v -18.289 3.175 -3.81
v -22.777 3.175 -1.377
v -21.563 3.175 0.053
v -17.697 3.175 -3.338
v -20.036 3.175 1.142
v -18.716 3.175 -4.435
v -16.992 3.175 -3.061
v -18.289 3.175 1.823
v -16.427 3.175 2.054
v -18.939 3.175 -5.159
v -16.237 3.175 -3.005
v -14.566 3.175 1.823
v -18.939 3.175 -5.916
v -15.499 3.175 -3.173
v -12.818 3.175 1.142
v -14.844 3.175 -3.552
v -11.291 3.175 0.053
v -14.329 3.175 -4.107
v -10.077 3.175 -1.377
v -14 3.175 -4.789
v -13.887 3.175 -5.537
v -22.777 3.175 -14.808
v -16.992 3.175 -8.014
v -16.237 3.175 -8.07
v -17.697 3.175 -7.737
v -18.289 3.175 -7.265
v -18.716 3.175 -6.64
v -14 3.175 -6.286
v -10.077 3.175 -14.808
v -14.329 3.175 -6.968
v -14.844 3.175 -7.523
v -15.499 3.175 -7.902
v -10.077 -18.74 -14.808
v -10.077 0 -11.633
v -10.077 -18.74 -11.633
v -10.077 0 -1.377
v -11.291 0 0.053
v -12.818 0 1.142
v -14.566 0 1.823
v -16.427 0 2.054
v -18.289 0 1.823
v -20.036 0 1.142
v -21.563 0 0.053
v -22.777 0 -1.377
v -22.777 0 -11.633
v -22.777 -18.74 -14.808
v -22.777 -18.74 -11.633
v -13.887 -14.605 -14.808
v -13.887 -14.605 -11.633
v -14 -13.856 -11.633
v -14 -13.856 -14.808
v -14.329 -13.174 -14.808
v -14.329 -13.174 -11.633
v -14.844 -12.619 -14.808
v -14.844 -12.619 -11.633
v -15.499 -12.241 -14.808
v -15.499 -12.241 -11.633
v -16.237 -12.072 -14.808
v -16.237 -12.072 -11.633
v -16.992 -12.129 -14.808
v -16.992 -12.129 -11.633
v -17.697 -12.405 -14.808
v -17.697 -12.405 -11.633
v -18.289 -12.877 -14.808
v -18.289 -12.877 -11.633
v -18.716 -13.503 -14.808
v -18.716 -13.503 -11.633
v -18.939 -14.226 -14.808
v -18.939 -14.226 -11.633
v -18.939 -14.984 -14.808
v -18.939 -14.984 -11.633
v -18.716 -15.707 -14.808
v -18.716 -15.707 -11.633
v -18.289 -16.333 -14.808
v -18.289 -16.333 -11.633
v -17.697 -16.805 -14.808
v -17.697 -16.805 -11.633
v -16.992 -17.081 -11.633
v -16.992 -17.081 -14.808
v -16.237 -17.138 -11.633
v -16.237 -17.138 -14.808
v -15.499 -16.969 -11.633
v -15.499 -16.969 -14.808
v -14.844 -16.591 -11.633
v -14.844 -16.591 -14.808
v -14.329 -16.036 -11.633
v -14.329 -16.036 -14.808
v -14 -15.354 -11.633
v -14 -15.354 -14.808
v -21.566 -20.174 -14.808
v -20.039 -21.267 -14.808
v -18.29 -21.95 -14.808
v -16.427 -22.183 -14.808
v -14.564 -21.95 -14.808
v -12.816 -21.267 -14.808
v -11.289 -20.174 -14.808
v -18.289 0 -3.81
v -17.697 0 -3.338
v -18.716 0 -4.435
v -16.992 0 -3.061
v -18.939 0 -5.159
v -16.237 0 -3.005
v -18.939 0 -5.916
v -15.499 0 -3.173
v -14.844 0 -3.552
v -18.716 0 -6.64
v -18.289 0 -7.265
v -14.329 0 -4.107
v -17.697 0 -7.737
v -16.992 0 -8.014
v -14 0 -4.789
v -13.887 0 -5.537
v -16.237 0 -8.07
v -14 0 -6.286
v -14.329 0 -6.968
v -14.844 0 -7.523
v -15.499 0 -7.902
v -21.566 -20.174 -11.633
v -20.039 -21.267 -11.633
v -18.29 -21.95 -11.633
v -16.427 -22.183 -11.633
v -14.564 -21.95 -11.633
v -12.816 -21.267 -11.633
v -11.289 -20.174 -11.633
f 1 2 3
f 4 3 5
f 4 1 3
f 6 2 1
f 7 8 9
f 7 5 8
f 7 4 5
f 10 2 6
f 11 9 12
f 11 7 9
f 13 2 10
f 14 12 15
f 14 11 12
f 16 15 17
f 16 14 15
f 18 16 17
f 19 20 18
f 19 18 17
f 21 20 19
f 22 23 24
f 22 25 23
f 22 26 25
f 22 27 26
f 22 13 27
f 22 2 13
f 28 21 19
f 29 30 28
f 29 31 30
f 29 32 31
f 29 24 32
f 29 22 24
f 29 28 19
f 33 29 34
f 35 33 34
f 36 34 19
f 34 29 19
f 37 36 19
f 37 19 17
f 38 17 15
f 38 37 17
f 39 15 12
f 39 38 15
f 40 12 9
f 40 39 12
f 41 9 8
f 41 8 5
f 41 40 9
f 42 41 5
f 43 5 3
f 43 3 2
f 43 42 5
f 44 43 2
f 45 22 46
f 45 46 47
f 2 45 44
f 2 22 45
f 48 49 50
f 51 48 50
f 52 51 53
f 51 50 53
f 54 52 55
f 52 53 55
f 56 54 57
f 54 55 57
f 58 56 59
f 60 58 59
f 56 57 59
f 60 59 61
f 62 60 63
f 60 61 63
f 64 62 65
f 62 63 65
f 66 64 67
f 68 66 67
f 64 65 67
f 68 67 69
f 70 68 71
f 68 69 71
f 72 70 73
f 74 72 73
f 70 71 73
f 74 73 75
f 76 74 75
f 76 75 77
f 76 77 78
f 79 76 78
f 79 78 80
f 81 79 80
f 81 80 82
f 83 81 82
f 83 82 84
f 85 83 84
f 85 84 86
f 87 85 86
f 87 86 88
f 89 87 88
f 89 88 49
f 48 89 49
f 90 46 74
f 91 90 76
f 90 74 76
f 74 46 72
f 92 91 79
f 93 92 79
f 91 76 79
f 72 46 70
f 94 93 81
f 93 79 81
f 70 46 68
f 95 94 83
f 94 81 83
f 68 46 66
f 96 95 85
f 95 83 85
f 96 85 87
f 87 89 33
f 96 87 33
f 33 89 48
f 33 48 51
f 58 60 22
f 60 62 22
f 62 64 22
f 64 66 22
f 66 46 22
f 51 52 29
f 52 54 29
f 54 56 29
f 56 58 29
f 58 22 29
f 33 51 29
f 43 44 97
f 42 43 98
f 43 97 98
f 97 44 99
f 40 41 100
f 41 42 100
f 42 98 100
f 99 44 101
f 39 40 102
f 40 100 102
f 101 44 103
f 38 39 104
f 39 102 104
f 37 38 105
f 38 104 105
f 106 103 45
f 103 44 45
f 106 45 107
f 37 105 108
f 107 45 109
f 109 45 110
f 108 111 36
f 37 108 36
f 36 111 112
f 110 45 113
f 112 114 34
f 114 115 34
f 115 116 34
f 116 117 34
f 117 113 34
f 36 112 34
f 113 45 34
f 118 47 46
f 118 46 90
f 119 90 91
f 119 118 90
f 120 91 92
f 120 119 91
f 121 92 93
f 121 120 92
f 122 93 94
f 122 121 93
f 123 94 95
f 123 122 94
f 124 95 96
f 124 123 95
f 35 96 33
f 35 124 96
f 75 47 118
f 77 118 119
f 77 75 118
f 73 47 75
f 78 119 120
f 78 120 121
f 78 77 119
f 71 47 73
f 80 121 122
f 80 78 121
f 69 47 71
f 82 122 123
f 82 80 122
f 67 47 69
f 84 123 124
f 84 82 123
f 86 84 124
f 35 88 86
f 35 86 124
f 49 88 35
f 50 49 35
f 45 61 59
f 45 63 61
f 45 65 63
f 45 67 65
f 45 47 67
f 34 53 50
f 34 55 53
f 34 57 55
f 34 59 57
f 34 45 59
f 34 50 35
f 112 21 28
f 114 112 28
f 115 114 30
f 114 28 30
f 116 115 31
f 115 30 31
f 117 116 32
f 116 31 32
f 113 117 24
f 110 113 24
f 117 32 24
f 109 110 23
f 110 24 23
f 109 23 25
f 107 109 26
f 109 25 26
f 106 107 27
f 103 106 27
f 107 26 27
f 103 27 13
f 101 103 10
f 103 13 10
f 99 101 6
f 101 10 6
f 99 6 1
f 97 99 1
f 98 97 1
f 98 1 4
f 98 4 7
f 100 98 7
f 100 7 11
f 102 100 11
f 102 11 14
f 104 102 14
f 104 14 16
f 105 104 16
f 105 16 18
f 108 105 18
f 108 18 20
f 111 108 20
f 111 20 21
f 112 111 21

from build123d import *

# Parameters (mm, degrees)
SKETCH1_W           = 12.7
SKETCH1_H           = 16.891
BOSS_EXTRUDE1_DEPTH = 3.175
SKETCH2_R           = 2.54
CUT_EXTRUDE1_DEPTH  = 4.175
SKETCH3_W           = 12.7
SKETCH3_H           = 3.175
BOSS_EXTRUDE2_DEPTH = 22.225
SKETCH4_R           = 2.54
CUT_EXTRUDE2_DEPTH  = 4.175
CUT_EXTRUDE3_DEPTH  = 4.175
CUT_EXTRUDE4_DEPTH  = 4.175


with BuildPart() as part:
    # Sketch1 → Boss-Extrude1 (new body)
    with BuildSketch(Plane(origin=(0, 0, 0), x_dir=(1, 0, 0), z_dir=(0, 1, 0))):
        with Locations((-16.427296288, 6.362973118)):
            Rectangle(SKETCH1_W, SKETCH1_H)
    extrude(amount=BOSS_EXTRUDE1_DEPTH)

    # Sketch2 → Cut-Extrude1 (cut, through all)
    with BuildSketch(Plane(origin=(0, 3.175, 0), x_dir=(1, 0, 0), z_dir=(0, 1, 0))):
        with Locations((-16.427296288, 5.537473118)):
            Circle(SKETCH2_R)
    extrude(amount=-CUT_EXTRUDE1_DEPTH, mode=Mode.SUBTRACT)

    # Sketch3 → Boss-Extrude2 (add)
    with BuildSketch(Plane.XZ):
        with Locations((-16.427296288, -13.220973118)):
            Rectangle(SKETCH3_W, SKETCH3_H)
    extrude(amount=BOSS_EXTRUDE2_DEPTH)

    # Sketch4 → Cut-Extrude2 (cut, through all)
    with BuildSketch(Plane.XY.offset(-11.633473118)):
        with Locations((-16.427296288, -14.605)):
            Circle(SKETCH4_R)
    extrude(amount=-CUT_EXTRUDE2_DEPTH, mode=Mode.SUBTRACT)

    # Sketch6 → Cut-Extrude3 (cut, through all)
    with BuildSketch(Plane.XY.offset(-11.633473118)):
        with BuildLine():
            Line((-10.077296288, -22.225), (-22.777296288, -22.225))
            Line((-22.777296288, -22.225), (-22.777296288, -18.739929724))
            ThreePointArc((-22.777296288, -18.739929724), (-16.427296288, -22.182608054), (-10.077296288, -18.739929724))
            Line((-10.077296288, -18.739929724), (-10.077296288, -22.225))
        make_face()
    extrude(amount=-CUT_EXTRUDE3_DEPTH, mode=Mode.SUBTRACT)

    # Sketch7 → Cut-Extrude4 (cut, through all)
    with BuildSketch(Plane.XZ):
        with BuildLine():
            Line((-22.777296288, -1.376737497), (-22.777296288, 2.082526882))
            Line((-22.777296288, 2.082526882), (-10.077296288, 2.082526882))
            Line((-10.077296288, 2.082526882), (-10.077296288, -1.376737497))
            ThreePointArc((-10.077296288, -1.376737497), (-16.427296288, 2.054247432), (-22.777296288, -1.376737497))
        make_face()
    extrude(amount=-CUT_EXTRUDE4_DEPTH, mode=Mode.SUBTRACT)


solid = part.part
